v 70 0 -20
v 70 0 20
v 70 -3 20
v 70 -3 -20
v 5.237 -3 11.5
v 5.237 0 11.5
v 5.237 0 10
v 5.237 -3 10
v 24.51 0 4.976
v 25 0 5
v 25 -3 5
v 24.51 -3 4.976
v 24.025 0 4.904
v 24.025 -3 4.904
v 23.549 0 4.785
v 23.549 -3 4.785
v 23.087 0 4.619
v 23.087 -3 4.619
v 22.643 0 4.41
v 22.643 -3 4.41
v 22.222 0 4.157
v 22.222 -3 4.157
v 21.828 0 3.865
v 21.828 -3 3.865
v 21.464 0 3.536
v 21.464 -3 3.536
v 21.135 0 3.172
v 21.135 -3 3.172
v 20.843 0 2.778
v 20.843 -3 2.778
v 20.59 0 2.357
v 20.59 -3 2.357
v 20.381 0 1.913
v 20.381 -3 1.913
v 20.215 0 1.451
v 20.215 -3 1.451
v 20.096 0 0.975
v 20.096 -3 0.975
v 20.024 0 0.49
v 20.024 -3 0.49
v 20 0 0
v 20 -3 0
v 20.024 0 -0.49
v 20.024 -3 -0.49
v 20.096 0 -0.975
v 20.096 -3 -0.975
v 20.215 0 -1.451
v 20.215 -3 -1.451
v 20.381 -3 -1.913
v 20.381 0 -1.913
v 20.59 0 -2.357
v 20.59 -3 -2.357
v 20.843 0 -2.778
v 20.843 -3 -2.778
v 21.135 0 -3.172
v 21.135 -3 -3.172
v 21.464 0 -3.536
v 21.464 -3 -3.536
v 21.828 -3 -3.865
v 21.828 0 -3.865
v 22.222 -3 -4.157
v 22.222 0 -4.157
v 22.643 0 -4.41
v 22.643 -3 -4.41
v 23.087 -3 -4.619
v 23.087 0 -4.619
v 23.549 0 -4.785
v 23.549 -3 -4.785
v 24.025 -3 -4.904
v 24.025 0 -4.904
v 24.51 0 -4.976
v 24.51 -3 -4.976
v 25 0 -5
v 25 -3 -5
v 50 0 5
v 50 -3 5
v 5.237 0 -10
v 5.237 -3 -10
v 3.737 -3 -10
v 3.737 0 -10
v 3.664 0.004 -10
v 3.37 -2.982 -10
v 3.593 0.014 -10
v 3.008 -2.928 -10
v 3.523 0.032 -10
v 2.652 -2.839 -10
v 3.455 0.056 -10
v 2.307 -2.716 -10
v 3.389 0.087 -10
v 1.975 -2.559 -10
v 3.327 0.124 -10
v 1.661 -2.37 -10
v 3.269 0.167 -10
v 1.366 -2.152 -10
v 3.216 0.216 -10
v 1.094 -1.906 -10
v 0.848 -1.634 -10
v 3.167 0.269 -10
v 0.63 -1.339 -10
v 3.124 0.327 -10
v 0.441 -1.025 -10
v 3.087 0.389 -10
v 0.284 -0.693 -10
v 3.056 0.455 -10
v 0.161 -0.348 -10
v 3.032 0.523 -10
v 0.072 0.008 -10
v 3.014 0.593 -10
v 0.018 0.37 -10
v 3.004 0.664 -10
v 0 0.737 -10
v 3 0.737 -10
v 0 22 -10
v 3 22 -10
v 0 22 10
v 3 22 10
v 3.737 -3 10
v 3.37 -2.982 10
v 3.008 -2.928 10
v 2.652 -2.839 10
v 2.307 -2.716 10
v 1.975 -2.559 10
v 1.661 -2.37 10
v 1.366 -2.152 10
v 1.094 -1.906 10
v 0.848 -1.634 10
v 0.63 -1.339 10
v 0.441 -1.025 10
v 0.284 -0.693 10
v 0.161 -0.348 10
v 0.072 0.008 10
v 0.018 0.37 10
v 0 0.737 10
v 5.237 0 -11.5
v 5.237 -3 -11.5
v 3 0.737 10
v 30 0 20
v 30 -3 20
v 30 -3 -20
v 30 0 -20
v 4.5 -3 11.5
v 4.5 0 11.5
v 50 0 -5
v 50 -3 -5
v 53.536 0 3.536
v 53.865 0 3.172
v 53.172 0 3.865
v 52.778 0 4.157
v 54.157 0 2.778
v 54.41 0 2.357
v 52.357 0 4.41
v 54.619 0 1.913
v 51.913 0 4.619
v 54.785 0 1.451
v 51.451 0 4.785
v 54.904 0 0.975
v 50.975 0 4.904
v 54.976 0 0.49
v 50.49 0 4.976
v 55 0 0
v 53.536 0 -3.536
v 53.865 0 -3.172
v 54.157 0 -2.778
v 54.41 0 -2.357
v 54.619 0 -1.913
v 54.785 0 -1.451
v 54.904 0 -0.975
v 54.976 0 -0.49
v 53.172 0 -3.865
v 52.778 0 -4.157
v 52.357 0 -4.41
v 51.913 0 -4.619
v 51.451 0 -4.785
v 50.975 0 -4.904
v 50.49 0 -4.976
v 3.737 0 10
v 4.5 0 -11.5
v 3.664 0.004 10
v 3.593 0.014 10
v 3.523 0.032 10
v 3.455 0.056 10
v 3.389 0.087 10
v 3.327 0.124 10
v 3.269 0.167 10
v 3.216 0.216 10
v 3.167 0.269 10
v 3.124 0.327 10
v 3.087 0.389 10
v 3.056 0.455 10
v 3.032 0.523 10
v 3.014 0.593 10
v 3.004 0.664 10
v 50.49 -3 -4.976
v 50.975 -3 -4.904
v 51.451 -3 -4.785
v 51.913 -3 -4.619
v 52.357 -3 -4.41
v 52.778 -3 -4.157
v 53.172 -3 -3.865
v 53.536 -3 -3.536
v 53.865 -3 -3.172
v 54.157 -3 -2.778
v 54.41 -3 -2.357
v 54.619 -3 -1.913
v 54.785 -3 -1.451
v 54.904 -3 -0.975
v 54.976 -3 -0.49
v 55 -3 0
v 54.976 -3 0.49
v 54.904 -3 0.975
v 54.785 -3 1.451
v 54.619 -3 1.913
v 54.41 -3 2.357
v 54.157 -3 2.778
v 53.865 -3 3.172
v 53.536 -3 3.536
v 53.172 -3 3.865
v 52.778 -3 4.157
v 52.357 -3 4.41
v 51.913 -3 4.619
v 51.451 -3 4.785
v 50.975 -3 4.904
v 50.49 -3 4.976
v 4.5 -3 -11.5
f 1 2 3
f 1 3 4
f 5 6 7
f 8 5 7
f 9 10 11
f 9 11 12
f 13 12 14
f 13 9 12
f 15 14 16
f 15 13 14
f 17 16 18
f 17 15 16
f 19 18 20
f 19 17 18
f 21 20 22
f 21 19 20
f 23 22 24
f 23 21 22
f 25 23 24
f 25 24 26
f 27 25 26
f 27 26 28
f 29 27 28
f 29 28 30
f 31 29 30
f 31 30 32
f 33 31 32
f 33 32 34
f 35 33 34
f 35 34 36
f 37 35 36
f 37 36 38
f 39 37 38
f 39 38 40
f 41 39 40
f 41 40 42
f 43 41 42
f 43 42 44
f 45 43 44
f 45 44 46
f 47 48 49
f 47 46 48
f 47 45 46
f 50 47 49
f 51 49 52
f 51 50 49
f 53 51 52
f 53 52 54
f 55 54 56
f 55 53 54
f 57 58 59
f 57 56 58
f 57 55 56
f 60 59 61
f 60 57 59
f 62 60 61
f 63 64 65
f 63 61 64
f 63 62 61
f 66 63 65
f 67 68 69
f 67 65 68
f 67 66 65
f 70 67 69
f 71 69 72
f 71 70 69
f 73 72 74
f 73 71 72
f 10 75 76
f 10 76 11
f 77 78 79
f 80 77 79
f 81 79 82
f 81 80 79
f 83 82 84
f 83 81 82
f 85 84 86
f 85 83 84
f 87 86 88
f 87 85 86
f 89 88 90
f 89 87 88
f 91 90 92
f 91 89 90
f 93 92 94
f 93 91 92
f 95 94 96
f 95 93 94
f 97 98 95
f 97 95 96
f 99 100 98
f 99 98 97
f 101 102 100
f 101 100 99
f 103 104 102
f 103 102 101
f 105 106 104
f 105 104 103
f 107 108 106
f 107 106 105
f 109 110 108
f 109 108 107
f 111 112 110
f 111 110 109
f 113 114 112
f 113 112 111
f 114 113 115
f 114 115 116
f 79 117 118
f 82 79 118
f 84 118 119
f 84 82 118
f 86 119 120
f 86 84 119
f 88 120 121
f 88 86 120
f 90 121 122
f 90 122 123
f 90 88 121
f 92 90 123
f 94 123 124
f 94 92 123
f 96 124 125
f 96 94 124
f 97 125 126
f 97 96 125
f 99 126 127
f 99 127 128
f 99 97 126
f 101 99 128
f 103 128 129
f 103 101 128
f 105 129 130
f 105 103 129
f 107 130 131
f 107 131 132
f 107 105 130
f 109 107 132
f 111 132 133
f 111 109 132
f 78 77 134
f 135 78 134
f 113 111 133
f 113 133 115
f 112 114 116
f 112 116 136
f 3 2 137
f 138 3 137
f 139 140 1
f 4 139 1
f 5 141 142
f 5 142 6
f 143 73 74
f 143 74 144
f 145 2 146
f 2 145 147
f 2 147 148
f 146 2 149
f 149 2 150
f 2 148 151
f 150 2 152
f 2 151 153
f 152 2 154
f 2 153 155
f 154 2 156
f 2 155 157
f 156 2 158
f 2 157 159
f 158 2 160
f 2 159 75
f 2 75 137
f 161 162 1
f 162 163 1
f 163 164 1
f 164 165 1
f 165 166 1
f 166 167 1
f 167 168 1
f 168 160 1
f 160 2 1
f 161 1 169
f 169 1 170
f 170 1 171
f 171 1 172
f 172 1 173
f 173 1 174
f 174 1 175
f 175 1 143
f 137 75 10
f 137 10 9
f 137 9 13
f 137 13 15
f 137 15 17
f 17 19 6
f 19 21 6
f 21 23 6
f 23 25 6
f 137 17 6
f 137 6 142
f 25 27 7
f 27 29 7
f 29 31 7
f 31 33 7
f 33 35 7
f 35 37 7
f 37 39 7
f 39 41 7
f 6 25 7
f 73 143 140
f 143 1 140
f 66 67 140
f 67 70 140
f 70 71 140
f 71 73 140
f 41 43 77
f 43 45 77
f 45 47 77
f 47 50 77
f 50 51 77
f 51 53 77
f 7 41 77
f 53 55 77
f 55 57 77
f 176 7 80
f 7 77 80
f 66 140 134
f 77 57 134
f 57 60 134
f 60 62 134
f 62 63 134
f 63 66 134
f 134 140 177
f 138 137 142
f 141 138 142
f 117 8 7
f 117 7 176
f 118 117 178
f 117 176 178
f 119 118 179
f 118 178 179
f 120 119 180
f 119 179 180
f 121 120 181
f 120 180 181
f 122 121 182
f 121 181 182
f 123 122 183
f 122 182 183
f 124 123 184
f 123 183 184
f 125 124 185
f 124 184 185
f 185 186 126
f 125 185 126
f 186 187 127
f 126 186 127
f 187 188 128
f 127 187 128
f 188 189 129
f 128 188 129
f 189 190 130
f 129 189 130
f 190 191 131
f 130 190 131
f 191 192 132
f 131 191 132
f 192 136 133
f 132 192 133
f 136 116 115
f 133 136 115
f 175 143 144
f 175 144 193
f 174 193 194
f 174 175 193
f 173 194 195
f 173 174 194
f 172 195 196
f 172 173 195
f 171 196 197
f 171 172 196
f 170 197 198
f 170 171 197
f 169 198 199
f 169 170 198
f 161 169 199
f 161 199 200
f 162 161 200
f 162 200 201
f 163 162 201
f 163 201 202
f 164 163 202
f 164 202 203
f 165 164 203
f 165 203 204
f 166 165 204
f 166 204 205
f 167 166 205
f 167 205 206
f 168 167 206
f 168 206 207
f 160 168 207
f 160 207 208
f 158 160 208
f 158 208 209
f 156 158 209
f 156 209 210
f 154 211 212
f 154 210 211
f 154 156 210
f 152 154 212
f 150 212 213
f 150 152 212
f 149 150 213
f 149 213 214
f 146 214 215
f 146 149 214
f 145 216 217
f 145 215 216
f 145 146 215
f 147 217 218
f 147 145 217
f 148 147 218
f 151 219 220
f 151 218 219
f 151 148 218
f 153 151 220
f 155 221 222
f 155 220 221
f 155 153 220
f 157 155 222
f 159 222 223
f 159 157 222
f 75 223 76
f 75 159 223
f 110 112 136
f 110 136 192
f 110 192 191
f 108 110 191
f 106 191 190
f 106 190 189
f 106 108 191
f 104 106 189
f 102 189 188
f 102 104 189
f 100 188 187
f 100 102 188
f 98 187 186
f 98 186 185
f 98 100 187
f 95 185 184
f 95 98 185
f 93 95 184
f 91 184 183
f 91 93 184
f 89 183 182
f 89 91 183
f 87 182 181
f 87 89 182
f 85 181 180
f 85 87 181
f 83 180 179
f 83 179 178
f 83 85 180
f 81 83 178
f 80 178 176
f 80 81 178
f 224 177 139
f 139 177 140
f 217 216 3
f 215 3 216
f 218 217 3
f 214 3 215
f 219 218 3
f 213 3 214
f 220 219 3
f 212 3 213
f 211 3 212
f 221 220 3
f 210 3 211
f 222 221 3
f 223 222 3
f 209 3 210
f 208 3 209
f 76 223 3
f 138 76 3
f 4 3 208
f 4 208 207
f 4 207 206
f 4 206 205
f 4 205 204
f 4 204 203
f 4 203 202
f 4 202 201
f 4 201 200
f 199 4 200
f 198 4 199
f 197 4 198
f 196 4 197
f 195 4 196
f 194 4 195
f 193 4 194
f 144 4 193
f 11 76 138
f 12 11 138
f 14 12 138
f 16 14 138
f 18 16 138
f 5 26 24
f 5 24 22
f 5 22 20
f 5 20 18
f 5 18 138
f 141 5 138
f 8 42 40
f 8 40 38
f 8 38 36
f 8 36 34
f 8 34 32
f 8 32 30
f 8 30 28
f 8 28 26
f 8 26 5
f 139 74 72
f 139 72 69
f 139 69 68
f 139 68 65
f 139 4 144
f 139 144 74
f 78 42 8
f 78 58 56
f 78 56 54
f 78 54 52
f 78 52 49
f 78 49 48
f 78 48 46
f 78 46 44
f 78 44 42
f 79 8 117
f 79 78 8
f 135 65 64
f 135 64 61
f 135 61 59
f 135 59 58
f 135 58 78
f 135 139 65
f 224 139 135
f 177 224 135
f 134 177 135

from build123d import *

# Parameters (mm, degrees)
BASE_FLANGE1_DEPTH            = 3
EDGE_FLANGE1_STRIP_W          = 13.4732
EDGE_FLANGE1_STRIP_H          = 3
EDGE_FLANGE1_STRIP_CUT_DEPTH  = 20
EDGE_FLANGE1_RELIEF_W         = 14.9732
EDGE_FLANGE1_RELIEF_H         = 1.5
EDGE_FLANGE1_RELIEF_CUT_DEPTH = 3
EDGE_FLANGE1_DEPTH            = 20
CUT_EXTRUDE1_DEPTH            = 10


# Sheet-metal steps are written as plain solids
with BuildPart() as part:
    # Sketch1 → Base-Flange1 (new body)
    with BuildSketch(Plane(origin=(0, 0, 0), x_dir=(1, 0, 0), z_dir=(0, 1, 0))):
        Polygon((0, 0), (0, 10), (30, 20), (70, 20), (70, 0), (70, -20), (30, -20), (0, -10), align=None)
    extrude(amount=-BASE_FLANGE1_DEPTH)

    # Edge-Flange1 strip (across the edge) → Edge-Flange1 strip cut (cut)
    with BuildSketch(Plane.XY.offset(-10)):
        with Locations((-3, -1.5)):
            Rectangle(EDGE_FLANGE1_STRIP_W, EDGE_FLANGE1_STRIP_H)
    extrude(amount=EDGE_FLANGE1_STRIP_CUT_DEPTH, mode=Mode.SUBTRACT)

    # Edge-Flange1 relief (on the sheet) → Edge-Flange1 relief cut (cut)
    with BuildSketch(Plane(origin=(3.7366, 0, -10), x_dir=(1, 0, 0), z_dir=(0, 1, 0))):
        with Locations((-5.9866, 0.75)):
            Rectangle(EDGE_FLANGE1_RELIEF_W, EDGE_FLANGE1_RELIEF_H)
        with Locations((-5.9866, -20.75)):
            Rectangle(EDGE_FLANGE1_RELIEF_W, EDGE_FLANGE1_RELIEF_H)
    extrude(amount=-EDGE_FLANGE1_RELIEF_CUT_DEPTH, mode=Mode.SUBTRACT)

    # Edge-Flange1 section (across the edge) → Edge-Flange1 (add)
    with BuildSketch(Plane.XY.offset(-10)):
        with BuildLine():
            Line((0, 0.7366), (0, 22))
            Line((0, 22), (3, 22))
            Line((3, 22), (3, 0.7366))
            ThreePointArc((3, 0.7366), (3.215745145, 0.215745145), (3.7366, 0))
            Line((3.7366, 0), (3.7366, -3))
            ThreePointArc((3.7366, -3), (1.094424801, -1.905575199), (0, 0.7366))
        make_face()
    extrude(amount=EDGE_FLANGE1_DEPTH)

    # Sketch9 → Cut-Extrude1 (cut)
    with BuildSketch(Plane(origin=(0, 0, 0), x_dir=(1, 0, 0), z_dir=(0, 1, 0))):
        with BuildLine():
            Line((50, -5), (25, -5))
            ThreePointArc((25, -5), (20, 0), (25, 5))
            Line((25, 5), (50, 5))
            ThreePointArc((50, 5), (55, 0), (50, -5))
        make_face()
    extrude(amount=-CUT_EXTRUDE1_DEPTH, mode=Mode.SUBTRACT)


solid = part.part
